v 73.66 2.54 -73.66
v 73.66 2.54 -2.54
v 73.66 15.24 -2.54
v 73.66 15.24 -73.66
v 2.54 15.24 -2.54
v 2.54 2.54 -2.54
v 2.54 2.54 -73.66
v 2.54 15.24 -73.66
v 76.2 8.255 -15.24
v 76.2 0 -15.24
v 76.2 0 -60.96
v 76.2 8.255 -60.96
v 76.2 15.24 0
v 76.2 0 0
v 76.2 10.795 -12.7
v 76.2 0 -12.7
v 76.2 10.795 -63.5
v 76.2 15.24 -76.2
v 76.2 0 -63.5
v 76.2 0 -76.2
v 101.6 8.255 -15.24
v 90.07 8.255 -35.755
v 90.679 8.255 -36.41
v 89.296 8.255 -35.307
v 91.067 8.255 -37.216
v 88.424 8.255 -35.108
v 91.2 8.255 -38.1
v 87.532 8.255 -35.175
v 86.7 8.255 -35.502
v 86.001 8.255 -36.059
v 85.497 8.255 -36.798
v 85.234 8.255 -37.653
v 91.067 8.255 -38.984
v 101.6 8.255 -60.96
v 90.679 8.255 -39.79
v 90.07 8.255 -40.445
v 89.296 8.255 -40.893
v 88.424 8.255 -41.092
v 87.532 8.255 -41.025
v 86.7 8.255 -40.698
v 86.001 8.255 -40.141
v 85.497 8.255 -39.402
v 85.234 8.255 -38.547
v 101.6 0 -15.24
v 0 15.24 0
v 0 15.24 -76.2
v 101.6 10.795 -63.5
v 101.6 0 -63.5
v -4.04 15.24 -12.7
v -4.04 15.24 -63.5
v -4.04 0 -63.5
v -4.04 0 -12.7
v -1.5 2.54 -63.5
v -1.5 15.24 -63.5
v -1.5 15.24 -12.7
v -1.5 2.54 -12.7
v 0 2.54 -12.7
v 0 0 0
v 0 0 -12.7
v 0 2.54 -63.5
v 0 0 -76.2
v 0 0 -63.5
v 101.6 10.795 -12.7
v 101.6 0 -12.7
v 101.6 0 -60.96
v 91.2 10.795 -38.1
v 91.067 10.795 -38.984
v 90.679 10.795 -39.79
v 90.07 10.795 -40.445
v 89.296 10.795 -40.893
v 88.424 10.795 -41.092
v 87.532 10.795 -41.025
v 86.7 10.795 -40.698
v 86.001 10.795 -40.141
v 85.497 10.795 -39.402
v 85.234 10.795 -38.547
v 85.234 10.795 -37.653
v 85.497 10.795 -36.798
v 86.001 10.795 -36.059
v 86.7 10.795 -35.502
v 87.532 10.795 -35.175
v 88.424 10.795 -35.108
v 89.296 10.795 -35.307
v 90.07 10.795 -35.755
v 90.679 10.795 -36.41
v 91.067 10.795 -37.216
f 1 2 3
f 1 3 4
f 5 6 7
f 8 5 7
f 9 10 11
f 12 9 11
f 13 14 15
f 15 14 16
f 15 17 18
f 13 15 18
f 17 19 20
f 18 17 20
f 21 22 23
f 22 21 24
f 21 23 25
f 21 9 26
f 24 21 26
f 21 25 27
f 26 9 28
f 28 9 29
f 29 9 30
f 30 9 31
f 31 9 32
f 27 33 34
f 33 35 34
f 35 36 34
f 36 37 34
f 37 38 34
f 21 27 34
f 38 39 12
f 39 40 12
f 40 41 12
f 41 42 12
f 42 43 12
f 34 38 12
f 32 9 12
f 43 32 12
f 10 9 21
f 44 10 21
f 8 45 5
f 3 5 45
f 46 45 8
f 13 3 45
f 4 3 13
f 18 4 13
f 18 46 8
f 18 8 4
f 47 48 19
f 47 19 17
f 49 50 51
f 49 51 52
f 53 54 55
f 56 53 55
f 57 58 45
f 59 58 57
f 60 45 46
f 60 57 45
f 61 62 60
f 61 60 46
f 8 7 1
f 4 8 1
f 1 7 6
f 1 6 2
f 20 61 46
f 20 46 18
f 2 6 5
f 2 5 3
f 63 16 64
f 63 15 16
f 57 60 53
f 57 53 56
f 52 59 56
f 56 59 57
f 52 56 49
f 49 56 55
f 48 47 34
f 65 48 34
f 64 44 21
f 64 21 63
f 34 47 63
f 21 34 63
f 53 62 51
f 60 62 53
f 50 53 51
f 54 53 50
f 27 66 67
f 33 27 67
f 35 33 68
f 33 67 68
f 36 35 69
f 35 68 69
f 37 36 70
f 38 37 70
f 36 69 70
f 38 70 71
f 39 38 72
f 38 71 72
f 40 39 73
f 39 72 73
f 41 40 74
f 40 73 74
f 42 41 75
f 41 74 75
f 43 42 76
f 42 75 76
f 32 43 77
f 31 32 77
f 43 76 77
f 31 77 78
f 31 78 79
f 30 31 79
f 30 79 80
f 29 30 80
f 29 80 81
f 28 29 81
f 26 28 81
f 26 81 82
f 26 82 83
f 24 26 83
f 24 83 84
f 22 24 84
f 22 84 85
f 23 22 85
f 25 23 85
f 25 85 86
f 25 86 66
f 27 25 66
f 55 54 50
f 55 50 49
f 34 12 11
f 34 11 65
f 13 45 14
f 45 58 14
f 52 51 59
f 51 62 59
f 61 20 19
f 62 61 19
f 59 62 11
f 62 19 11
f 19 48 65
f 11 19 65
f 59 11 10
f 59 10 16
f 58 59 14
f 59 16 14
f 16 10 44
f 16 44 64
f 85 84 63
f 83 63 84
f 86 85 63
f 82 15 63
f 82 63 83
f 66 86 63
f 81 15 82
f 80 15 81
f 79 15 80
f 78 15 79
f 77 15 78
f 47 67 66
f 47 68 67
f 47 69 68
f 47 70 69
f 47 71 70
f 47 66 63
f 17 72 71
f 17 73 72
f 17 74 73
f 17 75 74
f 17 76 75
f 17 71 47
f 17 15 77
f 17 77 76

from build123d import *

# Parameters (mm, degrees)
SKETCH1_W           = 76.2
SKETCH1_H           = 76.2
BOSS_EXTRUDE1_DEPTH = 2.54
SKETCH2_W           = 76.2
SKETCH2_H           = 76.2
SKETCH2_W_2         = 71.12
SKETCH2_H_2         = 71.12
BOSS_EXTRUDE2_DEPTH = 12.7
SKETCH3_W           = 50.8
SKETCH3_H           = 2.54
BOSS_EXTRUDE3_DEPTH = 25.4
SKETCH5_R           = 3
CUT_EXTRUDE2_DEPTH  = 11.795
SKETCH6_W           = 25.4
SKETCH6_H           = 2.54
BOSS_EXTRUDE4_DEPTH = 8.255
SKETCH9_W           = 50.8
SKETCH9_H           = 2.54
BOSS_EXTRUDE5_DEPTH = 1.5
SKETCH10_W          = 50.8
SKETCH10_H          = 15.24
BOSS_EXTRUDE6_DEPTH = 2.54


with BuildPart() as part:
    # Sketch1 → Boss-Extrude1 (new body)
    with BuildSketch(Plane(origin=(0, 0, 0), x_dir=(1, 0, 0), z_dir=(0, 1, 0))):
        with Locations((38.1, 38.1)):
            Rectangle(SKETCH1_W, SKETCH1_H)
    extrude(amount=BOSS_EXTRUDE1_DEPTH)

    # Sketch2 → Boss-Extrude2 (add)
    with BuildSketch(Plane(origin=(0, 2.54, 0), x_dir=(1, 0, 0), z_dir=(0, 1, 0))):
        with Locations((38.1, 38.1)):
            Rectangle(SKETCH2_W, SKETCH2_H)
        with Locations((38.1, 38.1)):
            Rectangle(SKETCH2_W_2, SKETCH2_H_2, mode=Mode.SUBTRACT)
    extrude(amount=BOSS_EXTRUDE2_DEPTH)

    # Sketch3 → Boss-Extrude3 (add)
    with BuildSketch(Plane(origin=(76.2, 0, 0), x_dir=(0, 0, -1), z_dir=(1, 0, 0))):
        with Locations((38.1, 9.525)):
            Rectangle(SKETCH3_W, SKETCH3_H)
    extrude(amount=BOSS_EXTRUDE3_DEPTH)

    # Sketch5 → Cut-Extrude2 (cut, through all)
    with BuildSketch(Plane(origin=(0, 10.795, 0), x_dir=(1, 0, 0), z_dir=(0, 1, 0))):
        with Locations((88.2, 38.1)):
            Circle(SKETCH5_R)
    extrude(amount=-CUT_EXTRUDE2_DEPTH, mode=Mode.SUBTRACT)

    # Sketch6 → Boss-Extrude4 (add)
    with BuildSketch(Plane.XZ.offset(-8.255)):
        with Locations((88.9, -13.97)):
            Rectangle(SKETCH6_W, SKETCH6_H)
        with Locations((88.9, -62.23)):
            Rectangle(SKETCH6_W, SKETCH6_H)
    extrude(amount=BOSS_EXTRUDE4_DEPTH)

    # Sketch9 → Boss-Extrude5 (add)
    with BuildSketch(Plane.ZY):
        with Locations((-38.1, 1.27)):
            Rectangle(SKETCH9_W, SKETCH9_H)
    extrude(amount=BOSS_EXTRUDE5_DEPTH)

    # Sketch10 → Boss-Extrude6 (add)
    with BuildSketch(Plane.ZY.offset(1.5)):
        with Locations((-38.1, 7.62)):
            Rectangle(SKETCH10_W, SKETCH10_H)
    extrude(amount=BOSS_EXTRUDE6_DEPTH)


solid = part.part
